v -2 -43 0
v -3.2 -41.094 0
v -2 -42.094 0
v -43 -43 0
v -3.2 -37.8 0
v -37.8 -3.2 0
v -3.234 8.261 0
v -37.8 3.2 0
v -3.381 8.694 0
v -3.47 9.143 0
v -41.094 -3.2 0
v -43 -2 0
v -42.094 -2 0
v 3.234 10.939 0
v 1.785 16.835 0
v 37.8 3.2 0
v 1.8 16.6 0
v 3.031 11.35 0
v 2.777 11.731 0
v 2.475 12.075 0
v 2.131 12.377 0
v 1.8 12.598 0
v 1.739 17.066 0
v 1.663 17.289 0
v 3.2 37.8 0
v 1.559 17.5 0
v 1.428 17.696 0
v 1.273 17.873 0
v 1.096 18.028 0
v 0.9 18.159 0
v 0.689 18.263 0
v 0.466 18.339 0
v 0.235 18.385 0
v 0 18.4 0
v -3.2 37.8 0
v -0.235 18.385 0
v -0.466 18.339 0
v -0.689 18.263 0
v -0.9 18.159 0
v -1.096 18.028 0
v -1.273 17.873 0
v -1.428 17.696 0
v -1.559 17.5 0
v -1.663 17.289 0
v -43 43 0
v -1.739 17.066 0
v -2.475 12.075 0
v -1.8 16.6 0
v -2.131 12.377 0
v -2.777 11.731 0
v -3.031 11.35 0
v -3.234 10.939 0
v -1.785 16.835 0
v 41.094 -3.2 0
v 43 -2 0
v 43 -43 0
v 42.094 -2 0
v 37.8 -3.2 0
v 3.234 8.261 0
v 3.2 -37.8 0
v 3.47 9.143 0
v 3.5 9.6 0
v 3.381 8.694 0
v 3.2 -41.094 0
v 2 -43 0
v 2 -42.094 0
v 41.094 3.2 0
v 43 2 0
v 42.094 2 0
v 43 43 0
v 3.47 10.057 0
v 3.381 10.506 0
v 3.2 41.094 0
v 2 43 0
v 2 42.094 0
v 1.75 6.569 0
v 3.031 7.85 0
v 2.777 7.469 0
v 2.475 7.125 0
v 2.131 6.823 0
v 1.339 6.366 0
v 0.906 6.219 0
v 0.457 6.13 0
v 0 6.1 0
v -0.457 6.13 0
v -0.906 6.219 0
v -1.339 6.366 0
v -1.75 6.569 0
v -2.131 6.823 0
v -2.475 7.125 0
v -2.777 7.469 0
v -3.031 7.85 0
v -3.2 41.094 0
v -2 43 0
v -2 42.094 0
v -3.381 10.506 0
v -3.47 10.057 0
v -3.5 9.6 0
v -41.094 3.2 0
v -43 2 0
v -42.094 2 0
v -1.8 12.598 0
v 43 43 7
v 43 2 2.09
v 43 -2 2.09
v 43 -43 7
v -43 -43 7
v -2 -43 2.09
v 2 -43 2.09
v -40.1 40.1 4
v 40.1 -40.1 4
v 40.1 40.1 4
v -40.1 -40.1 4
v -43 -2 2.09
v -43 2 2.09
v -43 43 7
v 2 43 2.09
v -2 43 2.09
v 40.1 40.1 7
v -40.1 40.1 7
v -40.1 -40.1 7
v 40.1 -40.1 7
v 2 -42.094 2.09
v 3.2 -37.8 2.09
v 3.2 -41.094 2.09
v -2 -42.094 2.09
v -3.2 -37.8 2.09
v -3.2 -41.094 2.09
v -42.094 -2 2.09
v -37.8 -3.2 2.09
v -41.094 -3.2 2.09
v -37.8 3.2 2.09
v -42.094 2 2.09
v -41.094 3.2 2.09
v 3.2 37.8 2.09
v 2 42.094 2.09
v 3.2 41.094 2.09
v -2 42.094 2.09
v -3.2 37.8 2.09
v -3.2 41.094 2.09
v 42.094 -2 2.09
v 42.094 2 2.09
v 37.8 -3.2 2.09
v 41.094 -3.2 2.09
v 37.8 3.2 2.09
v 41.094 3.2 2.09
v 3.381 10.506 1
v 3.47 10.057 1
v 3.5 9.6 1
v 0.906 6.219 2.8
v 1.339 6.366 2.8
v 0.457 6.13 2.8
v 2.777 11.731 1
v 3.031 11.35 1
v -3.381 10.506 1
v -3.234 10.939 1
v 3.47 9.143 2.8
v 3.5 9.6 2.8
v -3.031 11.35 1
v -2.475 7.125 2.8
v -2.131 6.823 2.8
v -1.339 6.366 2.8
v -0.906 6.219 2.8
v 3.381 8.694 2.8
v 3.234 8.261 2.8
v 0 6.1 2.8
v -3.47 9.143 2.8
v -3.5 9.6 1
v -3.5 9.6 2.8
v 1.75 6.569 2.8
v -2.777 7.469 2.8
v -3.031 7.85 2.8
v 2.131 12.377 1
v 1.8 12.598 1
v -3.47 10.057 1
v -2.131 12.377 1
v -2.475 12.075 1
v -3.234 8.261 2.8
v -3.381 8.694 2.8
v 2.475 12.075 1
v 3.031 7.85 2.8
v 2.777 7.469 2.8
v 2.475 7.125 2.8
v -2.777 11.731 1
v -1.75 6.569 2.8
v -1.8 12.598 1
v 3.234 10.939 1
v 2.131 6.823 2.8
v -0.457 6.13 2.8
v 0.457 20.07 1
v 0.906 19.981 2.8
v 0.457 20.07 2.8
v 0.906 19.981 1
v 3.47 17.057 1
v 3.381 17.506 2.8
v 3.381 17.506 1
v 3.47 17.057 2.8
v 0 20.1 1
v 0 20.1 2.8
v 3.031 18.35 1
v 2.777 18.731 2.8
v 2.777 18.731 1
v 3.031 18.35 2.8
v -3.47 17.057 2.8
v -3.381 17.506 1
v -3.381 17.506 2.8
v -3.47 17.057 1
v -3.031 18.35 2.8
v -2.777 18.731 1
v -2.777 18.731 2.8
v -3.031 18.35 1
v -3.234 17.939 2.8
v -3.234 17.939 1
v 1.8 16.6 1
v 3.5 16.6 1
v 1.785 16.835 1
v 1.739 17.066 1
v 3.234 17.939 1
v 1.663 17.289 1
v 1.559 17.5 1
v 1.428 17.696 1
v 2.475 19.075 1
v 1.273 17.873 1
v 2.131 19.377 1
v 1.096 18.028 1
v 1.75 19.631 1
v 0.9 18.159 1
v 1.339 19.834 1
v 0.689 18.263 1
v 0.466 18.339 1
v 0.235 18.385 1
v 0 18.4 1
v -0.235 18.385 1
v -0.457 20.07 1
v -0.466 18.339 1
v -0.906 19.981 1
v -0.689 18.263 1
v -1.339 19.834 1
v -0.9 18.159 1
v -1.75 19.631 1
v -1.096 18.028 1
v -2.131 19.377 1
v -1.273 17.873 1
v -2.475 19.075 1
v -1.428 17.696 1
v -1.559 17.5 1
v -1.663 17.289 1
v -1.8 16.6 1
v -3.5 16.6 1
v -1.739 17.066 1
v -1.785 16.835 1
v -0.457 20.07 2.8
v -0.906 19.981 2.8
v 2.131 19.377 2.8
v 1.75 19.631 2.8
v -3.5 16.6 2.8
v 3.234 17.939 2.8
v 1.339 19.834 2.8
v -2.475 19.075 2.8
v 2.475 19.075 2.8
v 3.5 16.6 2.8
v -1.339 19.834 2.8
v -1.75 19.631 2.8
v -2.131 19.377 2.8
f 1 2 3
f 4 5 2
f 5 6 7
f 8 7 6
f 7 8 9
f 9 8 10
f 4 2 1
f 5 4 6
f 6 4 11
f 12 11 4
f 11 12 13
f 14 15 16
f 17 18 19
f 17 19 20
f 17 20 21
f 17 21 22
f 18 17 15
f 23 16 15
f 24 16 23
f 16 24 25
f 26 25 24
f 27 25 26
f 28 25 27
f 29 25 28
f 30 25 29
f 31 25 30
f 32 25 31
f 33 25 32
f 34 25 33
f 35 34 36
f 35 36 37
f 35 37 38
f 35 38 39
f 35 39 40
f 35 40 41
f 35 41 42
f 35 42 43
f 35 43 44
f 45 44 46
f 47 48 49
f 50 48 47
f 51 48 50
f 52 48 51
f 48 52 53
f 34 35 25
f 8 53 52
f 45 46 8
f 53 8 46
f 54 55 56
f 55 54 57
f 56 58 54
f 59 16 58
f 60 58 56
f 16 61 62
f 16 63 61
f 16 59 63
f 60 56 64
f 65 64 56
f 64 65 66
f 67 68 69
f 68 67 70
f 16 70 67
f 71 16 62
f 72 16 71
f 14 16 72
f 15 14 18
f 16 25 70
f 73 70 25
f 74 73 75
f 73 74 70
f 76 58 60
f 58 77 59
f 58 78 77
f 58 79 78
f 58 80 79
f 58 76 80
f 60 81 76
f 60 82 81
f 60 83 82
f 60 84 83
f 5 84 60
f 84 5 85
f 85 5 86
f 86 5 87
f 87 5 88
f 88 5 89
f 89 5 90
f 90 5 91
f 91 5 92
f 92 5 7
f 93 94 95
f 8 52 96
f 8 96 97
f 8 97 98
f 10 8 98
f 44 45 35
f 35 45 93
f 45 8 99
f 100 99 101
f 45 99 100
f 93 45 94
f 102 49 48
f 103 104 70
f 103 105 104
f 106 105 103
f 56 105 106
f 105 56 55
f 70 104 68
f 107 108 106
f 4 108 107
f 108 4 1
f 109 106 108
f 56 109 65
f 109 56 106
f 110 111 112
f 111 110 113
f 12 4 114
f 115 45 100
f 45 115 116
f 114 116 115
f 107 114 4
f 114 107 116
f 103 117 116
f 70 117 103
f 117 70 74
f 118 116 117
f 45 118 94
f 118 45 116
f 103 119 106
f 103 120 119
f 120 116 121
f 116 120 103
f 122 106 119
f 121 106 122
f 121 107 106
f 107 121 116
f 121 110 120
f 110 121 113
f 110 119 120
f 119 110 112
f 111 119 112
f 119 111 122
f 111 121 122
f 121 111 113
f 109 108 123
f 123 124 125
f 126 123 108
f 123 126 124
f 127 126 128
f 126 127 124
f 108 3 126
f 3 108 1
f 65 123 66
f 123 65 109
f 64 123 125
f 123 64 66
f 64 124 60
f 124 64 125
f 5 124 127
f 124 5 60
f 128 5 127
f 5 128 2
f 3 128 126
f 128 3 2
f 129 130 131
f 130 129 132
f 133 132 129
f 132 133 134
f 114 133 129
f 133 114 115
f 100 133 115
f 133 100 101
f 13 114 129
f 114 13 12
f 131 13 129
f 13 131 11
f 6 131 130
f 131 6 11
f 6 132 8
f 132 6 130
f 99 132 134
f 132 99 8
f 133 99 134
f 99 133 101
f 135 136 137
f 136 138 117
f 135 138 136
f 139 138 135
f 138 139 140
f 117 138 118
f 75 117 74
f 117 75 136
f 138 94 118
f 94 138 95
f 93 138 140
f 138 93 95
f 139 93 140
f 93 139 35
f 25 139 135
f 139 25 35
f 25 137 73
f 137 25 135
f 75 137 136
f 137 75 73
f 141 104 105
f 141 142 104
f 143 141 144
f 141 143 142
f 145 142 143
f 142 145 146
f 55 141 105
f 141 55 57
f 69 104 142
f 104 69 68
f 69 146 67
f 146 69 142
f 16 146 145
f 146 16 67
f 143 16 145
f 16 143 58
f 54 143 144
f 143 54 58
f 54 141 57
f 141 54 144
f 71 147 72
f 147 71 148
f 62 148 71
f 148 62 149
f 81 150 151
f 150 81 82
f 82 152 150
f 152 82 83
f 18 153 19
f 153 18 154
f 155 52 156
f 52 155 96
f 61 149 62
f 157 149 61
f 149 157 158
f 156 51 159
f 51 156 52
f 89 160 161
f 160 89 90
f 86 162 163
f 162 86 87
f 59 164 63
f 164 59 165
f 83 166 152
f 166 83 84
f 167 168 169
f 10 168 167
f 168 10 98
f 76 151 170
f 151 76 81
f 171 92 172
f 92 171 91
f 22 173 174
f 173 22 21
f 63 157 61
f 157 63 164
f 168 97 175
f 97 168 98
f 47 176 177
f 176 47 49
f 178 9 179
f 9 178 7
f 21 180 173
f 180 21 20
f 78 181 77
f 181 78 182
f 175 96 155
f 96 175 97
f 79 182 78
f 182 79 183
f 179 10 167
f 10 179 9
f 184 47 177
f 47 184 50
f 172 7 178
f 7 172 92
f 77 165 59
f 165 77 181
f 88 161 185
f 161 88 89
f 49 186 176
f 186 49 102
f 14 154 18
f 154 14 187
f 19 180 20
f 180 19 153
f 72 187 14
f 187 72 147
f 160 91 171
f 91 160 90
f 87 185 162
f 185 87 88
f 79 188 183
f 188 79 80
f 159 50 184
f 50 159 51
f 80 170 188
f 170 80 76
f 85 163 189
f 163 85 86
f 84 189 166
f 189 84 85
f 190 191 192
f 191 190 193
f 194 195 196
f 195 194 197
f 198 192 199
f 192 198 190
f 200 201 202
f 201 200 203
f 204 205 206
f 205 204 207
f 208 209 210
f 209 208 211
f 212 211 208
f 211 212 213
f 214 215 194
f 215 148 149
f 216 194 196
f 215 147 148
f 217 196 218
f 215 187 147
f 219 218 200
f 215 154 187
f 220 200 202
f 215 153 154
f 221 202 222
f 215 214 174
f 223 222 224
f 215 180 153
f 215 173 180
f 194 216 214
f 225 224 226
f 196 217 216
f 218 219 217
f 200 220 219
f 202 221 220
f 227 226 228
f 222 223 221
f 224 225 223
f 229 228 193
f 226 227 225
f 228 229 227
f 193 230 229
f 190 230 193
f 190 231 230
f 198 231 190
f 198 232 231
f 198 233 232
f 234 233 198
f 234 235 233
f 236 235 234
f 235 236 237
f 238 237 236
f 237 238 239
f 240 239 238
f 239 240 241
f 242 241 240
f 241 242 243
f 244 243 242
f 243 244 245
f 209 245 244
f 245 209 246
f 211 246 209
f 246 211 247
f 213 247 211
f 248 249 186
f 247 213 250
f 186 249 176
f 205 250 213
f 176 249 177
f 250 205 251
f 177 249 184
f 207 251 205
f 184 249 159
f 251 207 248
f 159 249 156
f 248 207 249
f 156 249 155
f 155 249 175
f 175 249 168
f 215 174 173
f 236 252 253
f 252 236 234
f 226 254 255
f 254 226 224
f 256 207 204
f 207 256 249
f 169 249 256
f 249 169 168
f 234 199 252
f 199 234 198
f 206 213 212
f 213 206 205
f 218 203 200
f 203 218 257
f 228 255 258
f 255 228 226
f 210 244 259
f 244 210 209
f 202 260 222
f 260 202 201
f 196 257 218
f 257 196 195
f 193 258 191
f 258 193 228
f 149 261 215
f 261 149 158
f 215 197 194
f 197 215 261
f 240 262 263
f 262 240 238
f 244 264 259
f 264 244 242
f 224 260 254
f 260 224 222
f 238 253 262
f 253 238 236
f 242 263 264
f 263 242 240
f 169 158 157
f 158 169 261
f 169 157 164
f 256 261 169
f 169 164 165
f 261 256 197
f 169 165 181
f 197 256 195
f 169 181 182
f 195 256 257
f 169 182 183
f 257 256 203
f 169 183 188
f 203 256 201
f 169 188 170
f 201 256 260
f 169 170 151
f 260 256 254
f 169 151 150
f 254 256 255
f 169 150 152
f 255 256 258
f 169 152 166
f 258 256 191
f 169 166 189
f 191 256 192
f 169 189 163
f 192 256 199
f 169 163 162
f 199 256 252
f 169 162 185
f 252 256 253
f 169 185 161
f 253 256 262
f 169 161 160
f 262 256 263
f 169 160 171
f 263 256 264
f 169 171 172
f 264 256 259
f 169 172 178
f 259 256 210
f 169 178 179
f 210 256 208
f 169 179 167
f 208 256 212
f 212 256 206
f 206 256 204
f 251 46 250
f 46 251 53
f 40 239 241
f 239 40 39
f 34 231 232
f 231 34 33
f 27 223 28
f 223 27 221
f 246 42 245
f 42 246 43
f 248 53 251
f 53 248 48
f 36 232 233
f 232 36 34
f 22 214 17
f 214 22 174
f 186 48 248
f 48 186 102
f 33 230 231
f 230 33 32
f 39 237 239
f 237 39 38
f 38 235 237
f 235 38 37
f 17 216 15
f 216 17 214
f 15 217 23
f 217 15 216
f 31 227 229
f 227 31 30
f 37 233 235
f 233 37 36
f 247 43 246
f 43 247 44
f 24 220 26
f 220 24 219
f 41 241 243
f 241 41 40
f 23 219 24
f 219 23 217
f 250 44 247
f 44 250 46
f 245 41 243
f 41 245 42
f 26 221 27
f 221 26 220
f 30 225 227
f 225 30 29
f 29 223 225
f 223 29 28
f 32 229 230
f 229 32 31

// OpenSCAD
// Contour Studio square holder. mm. Same sockets and keyhole as modular map holders.
$fn=48; tile=80; gap=6; tolerance=.2; seat=4; rim=3;
module tile_shape(){polygon([[40.0, -40.0], [40.0, 40.0], [-40.0, 40.0], [-40.0, -40.0]]);}
module key_shape(){polygon([[-5,-3],[-2,-3],[-1,-1.8],[1,-1.8],[2,-3],[5,-3],[5,3],[2,3],[1,1.8],[-1,1.8],[-2,3],[-5,3]]);}
difference(){
 union(){linear_extrude(seat) offset(delta=gap/2) tile_shape();translate([0,0,seat]) linear_extrude(rim) difference(){offset(delta=gap/2) tile_shape();offset(delta=tolerance/2) tile_shape();}}
translate([0.0,-43.0,-.01]) rotate([0,0,-90.0]) linear_extrude(2.1) offset(delta=tolerance) key_shape();
translate([-43.0,0.0,-.01]) rotate([0,0,180.0]) linear_extrude(2.1) offset(delta=tolerance) key_shape();
translate([0.0,43.0,-.01]) rotate([0,0,90.0]) linear_extrude(2.1) offset(delta=tolerance) key_shape();
translate([43.0,0.0,-.01]) rotate([0,0,0.0]) linear_extrude(2.1) offset(delta=tolerance) key_shape();
translate([0,9.6,-.01]) cylinder(h=2.8,r=3.5);
translate([0,9.6,1]) linear_extrude(1.8) hull(){circle(r=3.5);translate([0,7]) circle(r=3.5);}
translate([0,9.6,-.01]) linear_extrude(1.1) hull(){circle(r=1.8);translate([0,7]) circle(r=1.8);}
}
